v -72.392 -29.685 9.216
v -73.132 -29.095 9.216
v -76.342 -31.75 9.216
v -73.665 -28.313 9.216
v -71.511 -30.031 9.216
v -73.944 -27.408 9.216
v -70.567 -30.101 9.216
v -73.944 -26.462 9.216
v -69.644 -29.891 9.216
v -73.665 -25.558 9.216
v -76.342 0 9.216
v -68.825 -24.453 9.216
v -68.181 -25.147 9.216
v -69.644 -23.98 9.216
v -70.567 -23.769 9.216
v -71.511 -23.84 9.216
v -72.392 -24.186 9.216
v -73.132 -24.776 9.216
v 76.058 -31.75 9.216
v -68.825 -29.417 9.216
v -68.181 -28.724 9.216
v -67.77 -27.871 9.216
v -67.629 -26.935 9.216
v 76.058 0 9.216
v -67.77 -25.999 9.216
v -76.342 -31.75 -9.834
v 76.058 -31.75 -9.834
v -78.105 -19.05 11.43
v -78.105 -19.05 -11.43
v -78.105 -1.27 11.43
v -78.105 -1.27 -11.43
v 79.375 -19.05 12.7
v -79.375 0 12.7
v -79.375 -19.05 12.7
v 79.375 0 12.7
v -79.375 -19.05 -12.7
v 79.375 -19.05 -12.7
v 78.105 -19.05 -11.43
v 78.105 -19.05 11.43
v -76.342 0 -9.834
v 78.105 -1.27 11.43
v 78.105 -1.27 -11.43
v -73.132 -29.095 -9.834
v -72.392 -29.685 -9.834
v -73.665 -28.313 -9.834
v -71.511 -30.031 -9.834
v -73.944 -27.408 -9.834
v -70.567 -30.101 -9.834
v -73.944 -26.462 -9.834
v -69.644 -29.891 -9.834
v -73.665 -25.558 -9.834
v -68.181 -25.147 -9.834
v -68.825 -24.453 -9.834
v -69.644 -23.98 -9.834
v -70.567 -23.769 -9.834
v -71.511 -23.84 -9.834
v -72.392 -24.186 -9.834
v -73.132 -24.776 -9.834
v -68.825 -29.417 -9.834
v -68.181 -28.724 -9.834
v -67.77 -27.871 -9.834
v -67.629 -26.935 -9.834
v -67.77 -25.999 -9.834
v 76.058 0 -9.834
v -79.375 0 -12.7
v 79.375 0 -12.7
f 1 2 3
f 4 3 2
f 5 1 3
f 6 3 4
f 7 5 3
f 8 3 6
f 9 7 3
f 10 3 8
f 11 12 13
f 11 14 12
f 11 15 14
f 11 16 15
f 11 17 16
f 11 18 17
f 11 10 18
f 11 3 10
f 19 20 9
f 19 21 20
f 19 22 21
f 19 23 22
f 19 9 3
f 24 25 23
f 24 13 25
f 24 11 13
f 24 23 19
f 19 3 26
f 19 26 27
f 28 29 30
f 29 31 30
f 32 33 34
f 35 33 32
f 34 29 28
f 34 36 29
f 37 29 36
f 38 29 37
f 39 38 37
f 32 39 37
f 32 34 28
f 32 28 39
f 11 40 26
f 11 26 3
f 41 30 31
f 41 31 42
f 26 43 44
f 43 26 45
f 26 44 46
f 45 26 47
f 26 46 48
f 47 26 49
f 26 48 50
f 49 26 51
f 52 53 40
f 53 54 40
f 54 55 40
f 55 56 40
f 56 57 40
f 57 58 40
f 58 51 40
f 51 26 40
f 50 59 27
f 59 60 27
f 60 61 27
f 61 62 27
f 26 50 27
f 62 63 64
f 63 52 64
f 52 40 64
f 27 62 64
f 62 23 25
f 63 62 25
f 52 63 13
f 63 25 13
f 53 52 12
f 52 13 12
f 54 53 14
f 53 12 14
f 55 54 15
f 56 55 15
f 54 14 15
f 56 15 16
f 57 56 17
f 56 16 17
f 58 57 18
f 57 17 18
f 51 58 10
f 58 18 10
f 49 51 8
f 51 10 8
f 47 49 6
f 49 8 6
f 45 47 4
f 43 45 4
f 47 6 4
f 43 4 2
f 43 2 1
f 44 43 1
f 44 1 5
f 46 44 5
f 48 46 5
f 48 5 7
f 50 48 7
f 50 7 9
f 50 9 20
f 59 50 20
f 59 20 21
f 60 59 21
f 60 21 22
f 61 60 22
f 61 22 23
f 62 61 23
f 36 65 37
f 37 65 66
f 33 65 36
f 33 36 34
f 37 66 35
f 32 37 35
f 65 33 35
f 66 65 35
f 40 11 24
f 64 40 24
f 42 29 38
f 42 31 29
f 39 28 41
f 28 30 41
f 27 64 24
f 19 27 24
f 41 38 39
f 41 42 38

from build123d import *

# Parameters (mm, degrees)
F0_W     = 158.75
F0_H     = 25.4
F1_DEPTH = 19.05
F2_T     = -1.27
F3_W     = 152.4
F3_H     = 19.05
F4_DEPTH = 31.75
F5_R     = 3.175
F6_DEPTH = 25.4


with BuildPart() as f1:
    # F0 (on Front) → F1 (new body)
    with BuildSketch(Plane.XZ):
        Rectangle(F0_W, F0_H)
    extrude(amount=F1_DEPTH)

    # F2
    f2_openings = [f1.faces().sort_by_distance(p)[0] for p in [
        (0, -19.05, 0),
    ]]
    offset(amount=F2_T, openings=f2_openings)


with BuildPart() as f4:
    # F3 (on Front) → F4 (new body)
    with BuildSketch(Plane.XZ):
        with Locations((-0.141865, -0.30942)):
            Rectangle(F3_W, F3_H)
    extrude(amount=F4_DEPTH)

    # F5 (on face) → F6 (cut)
    with BuildSketch(Plane.XY.offset(9.21558)):
        with Locations((-70.804305, -26.935184)):
            Circle(F5_R)
    extrude(amount=-F6_DEPTH, mode=Mode.SUBTRACT)


solid = Compound([f1.part, f4.part])
